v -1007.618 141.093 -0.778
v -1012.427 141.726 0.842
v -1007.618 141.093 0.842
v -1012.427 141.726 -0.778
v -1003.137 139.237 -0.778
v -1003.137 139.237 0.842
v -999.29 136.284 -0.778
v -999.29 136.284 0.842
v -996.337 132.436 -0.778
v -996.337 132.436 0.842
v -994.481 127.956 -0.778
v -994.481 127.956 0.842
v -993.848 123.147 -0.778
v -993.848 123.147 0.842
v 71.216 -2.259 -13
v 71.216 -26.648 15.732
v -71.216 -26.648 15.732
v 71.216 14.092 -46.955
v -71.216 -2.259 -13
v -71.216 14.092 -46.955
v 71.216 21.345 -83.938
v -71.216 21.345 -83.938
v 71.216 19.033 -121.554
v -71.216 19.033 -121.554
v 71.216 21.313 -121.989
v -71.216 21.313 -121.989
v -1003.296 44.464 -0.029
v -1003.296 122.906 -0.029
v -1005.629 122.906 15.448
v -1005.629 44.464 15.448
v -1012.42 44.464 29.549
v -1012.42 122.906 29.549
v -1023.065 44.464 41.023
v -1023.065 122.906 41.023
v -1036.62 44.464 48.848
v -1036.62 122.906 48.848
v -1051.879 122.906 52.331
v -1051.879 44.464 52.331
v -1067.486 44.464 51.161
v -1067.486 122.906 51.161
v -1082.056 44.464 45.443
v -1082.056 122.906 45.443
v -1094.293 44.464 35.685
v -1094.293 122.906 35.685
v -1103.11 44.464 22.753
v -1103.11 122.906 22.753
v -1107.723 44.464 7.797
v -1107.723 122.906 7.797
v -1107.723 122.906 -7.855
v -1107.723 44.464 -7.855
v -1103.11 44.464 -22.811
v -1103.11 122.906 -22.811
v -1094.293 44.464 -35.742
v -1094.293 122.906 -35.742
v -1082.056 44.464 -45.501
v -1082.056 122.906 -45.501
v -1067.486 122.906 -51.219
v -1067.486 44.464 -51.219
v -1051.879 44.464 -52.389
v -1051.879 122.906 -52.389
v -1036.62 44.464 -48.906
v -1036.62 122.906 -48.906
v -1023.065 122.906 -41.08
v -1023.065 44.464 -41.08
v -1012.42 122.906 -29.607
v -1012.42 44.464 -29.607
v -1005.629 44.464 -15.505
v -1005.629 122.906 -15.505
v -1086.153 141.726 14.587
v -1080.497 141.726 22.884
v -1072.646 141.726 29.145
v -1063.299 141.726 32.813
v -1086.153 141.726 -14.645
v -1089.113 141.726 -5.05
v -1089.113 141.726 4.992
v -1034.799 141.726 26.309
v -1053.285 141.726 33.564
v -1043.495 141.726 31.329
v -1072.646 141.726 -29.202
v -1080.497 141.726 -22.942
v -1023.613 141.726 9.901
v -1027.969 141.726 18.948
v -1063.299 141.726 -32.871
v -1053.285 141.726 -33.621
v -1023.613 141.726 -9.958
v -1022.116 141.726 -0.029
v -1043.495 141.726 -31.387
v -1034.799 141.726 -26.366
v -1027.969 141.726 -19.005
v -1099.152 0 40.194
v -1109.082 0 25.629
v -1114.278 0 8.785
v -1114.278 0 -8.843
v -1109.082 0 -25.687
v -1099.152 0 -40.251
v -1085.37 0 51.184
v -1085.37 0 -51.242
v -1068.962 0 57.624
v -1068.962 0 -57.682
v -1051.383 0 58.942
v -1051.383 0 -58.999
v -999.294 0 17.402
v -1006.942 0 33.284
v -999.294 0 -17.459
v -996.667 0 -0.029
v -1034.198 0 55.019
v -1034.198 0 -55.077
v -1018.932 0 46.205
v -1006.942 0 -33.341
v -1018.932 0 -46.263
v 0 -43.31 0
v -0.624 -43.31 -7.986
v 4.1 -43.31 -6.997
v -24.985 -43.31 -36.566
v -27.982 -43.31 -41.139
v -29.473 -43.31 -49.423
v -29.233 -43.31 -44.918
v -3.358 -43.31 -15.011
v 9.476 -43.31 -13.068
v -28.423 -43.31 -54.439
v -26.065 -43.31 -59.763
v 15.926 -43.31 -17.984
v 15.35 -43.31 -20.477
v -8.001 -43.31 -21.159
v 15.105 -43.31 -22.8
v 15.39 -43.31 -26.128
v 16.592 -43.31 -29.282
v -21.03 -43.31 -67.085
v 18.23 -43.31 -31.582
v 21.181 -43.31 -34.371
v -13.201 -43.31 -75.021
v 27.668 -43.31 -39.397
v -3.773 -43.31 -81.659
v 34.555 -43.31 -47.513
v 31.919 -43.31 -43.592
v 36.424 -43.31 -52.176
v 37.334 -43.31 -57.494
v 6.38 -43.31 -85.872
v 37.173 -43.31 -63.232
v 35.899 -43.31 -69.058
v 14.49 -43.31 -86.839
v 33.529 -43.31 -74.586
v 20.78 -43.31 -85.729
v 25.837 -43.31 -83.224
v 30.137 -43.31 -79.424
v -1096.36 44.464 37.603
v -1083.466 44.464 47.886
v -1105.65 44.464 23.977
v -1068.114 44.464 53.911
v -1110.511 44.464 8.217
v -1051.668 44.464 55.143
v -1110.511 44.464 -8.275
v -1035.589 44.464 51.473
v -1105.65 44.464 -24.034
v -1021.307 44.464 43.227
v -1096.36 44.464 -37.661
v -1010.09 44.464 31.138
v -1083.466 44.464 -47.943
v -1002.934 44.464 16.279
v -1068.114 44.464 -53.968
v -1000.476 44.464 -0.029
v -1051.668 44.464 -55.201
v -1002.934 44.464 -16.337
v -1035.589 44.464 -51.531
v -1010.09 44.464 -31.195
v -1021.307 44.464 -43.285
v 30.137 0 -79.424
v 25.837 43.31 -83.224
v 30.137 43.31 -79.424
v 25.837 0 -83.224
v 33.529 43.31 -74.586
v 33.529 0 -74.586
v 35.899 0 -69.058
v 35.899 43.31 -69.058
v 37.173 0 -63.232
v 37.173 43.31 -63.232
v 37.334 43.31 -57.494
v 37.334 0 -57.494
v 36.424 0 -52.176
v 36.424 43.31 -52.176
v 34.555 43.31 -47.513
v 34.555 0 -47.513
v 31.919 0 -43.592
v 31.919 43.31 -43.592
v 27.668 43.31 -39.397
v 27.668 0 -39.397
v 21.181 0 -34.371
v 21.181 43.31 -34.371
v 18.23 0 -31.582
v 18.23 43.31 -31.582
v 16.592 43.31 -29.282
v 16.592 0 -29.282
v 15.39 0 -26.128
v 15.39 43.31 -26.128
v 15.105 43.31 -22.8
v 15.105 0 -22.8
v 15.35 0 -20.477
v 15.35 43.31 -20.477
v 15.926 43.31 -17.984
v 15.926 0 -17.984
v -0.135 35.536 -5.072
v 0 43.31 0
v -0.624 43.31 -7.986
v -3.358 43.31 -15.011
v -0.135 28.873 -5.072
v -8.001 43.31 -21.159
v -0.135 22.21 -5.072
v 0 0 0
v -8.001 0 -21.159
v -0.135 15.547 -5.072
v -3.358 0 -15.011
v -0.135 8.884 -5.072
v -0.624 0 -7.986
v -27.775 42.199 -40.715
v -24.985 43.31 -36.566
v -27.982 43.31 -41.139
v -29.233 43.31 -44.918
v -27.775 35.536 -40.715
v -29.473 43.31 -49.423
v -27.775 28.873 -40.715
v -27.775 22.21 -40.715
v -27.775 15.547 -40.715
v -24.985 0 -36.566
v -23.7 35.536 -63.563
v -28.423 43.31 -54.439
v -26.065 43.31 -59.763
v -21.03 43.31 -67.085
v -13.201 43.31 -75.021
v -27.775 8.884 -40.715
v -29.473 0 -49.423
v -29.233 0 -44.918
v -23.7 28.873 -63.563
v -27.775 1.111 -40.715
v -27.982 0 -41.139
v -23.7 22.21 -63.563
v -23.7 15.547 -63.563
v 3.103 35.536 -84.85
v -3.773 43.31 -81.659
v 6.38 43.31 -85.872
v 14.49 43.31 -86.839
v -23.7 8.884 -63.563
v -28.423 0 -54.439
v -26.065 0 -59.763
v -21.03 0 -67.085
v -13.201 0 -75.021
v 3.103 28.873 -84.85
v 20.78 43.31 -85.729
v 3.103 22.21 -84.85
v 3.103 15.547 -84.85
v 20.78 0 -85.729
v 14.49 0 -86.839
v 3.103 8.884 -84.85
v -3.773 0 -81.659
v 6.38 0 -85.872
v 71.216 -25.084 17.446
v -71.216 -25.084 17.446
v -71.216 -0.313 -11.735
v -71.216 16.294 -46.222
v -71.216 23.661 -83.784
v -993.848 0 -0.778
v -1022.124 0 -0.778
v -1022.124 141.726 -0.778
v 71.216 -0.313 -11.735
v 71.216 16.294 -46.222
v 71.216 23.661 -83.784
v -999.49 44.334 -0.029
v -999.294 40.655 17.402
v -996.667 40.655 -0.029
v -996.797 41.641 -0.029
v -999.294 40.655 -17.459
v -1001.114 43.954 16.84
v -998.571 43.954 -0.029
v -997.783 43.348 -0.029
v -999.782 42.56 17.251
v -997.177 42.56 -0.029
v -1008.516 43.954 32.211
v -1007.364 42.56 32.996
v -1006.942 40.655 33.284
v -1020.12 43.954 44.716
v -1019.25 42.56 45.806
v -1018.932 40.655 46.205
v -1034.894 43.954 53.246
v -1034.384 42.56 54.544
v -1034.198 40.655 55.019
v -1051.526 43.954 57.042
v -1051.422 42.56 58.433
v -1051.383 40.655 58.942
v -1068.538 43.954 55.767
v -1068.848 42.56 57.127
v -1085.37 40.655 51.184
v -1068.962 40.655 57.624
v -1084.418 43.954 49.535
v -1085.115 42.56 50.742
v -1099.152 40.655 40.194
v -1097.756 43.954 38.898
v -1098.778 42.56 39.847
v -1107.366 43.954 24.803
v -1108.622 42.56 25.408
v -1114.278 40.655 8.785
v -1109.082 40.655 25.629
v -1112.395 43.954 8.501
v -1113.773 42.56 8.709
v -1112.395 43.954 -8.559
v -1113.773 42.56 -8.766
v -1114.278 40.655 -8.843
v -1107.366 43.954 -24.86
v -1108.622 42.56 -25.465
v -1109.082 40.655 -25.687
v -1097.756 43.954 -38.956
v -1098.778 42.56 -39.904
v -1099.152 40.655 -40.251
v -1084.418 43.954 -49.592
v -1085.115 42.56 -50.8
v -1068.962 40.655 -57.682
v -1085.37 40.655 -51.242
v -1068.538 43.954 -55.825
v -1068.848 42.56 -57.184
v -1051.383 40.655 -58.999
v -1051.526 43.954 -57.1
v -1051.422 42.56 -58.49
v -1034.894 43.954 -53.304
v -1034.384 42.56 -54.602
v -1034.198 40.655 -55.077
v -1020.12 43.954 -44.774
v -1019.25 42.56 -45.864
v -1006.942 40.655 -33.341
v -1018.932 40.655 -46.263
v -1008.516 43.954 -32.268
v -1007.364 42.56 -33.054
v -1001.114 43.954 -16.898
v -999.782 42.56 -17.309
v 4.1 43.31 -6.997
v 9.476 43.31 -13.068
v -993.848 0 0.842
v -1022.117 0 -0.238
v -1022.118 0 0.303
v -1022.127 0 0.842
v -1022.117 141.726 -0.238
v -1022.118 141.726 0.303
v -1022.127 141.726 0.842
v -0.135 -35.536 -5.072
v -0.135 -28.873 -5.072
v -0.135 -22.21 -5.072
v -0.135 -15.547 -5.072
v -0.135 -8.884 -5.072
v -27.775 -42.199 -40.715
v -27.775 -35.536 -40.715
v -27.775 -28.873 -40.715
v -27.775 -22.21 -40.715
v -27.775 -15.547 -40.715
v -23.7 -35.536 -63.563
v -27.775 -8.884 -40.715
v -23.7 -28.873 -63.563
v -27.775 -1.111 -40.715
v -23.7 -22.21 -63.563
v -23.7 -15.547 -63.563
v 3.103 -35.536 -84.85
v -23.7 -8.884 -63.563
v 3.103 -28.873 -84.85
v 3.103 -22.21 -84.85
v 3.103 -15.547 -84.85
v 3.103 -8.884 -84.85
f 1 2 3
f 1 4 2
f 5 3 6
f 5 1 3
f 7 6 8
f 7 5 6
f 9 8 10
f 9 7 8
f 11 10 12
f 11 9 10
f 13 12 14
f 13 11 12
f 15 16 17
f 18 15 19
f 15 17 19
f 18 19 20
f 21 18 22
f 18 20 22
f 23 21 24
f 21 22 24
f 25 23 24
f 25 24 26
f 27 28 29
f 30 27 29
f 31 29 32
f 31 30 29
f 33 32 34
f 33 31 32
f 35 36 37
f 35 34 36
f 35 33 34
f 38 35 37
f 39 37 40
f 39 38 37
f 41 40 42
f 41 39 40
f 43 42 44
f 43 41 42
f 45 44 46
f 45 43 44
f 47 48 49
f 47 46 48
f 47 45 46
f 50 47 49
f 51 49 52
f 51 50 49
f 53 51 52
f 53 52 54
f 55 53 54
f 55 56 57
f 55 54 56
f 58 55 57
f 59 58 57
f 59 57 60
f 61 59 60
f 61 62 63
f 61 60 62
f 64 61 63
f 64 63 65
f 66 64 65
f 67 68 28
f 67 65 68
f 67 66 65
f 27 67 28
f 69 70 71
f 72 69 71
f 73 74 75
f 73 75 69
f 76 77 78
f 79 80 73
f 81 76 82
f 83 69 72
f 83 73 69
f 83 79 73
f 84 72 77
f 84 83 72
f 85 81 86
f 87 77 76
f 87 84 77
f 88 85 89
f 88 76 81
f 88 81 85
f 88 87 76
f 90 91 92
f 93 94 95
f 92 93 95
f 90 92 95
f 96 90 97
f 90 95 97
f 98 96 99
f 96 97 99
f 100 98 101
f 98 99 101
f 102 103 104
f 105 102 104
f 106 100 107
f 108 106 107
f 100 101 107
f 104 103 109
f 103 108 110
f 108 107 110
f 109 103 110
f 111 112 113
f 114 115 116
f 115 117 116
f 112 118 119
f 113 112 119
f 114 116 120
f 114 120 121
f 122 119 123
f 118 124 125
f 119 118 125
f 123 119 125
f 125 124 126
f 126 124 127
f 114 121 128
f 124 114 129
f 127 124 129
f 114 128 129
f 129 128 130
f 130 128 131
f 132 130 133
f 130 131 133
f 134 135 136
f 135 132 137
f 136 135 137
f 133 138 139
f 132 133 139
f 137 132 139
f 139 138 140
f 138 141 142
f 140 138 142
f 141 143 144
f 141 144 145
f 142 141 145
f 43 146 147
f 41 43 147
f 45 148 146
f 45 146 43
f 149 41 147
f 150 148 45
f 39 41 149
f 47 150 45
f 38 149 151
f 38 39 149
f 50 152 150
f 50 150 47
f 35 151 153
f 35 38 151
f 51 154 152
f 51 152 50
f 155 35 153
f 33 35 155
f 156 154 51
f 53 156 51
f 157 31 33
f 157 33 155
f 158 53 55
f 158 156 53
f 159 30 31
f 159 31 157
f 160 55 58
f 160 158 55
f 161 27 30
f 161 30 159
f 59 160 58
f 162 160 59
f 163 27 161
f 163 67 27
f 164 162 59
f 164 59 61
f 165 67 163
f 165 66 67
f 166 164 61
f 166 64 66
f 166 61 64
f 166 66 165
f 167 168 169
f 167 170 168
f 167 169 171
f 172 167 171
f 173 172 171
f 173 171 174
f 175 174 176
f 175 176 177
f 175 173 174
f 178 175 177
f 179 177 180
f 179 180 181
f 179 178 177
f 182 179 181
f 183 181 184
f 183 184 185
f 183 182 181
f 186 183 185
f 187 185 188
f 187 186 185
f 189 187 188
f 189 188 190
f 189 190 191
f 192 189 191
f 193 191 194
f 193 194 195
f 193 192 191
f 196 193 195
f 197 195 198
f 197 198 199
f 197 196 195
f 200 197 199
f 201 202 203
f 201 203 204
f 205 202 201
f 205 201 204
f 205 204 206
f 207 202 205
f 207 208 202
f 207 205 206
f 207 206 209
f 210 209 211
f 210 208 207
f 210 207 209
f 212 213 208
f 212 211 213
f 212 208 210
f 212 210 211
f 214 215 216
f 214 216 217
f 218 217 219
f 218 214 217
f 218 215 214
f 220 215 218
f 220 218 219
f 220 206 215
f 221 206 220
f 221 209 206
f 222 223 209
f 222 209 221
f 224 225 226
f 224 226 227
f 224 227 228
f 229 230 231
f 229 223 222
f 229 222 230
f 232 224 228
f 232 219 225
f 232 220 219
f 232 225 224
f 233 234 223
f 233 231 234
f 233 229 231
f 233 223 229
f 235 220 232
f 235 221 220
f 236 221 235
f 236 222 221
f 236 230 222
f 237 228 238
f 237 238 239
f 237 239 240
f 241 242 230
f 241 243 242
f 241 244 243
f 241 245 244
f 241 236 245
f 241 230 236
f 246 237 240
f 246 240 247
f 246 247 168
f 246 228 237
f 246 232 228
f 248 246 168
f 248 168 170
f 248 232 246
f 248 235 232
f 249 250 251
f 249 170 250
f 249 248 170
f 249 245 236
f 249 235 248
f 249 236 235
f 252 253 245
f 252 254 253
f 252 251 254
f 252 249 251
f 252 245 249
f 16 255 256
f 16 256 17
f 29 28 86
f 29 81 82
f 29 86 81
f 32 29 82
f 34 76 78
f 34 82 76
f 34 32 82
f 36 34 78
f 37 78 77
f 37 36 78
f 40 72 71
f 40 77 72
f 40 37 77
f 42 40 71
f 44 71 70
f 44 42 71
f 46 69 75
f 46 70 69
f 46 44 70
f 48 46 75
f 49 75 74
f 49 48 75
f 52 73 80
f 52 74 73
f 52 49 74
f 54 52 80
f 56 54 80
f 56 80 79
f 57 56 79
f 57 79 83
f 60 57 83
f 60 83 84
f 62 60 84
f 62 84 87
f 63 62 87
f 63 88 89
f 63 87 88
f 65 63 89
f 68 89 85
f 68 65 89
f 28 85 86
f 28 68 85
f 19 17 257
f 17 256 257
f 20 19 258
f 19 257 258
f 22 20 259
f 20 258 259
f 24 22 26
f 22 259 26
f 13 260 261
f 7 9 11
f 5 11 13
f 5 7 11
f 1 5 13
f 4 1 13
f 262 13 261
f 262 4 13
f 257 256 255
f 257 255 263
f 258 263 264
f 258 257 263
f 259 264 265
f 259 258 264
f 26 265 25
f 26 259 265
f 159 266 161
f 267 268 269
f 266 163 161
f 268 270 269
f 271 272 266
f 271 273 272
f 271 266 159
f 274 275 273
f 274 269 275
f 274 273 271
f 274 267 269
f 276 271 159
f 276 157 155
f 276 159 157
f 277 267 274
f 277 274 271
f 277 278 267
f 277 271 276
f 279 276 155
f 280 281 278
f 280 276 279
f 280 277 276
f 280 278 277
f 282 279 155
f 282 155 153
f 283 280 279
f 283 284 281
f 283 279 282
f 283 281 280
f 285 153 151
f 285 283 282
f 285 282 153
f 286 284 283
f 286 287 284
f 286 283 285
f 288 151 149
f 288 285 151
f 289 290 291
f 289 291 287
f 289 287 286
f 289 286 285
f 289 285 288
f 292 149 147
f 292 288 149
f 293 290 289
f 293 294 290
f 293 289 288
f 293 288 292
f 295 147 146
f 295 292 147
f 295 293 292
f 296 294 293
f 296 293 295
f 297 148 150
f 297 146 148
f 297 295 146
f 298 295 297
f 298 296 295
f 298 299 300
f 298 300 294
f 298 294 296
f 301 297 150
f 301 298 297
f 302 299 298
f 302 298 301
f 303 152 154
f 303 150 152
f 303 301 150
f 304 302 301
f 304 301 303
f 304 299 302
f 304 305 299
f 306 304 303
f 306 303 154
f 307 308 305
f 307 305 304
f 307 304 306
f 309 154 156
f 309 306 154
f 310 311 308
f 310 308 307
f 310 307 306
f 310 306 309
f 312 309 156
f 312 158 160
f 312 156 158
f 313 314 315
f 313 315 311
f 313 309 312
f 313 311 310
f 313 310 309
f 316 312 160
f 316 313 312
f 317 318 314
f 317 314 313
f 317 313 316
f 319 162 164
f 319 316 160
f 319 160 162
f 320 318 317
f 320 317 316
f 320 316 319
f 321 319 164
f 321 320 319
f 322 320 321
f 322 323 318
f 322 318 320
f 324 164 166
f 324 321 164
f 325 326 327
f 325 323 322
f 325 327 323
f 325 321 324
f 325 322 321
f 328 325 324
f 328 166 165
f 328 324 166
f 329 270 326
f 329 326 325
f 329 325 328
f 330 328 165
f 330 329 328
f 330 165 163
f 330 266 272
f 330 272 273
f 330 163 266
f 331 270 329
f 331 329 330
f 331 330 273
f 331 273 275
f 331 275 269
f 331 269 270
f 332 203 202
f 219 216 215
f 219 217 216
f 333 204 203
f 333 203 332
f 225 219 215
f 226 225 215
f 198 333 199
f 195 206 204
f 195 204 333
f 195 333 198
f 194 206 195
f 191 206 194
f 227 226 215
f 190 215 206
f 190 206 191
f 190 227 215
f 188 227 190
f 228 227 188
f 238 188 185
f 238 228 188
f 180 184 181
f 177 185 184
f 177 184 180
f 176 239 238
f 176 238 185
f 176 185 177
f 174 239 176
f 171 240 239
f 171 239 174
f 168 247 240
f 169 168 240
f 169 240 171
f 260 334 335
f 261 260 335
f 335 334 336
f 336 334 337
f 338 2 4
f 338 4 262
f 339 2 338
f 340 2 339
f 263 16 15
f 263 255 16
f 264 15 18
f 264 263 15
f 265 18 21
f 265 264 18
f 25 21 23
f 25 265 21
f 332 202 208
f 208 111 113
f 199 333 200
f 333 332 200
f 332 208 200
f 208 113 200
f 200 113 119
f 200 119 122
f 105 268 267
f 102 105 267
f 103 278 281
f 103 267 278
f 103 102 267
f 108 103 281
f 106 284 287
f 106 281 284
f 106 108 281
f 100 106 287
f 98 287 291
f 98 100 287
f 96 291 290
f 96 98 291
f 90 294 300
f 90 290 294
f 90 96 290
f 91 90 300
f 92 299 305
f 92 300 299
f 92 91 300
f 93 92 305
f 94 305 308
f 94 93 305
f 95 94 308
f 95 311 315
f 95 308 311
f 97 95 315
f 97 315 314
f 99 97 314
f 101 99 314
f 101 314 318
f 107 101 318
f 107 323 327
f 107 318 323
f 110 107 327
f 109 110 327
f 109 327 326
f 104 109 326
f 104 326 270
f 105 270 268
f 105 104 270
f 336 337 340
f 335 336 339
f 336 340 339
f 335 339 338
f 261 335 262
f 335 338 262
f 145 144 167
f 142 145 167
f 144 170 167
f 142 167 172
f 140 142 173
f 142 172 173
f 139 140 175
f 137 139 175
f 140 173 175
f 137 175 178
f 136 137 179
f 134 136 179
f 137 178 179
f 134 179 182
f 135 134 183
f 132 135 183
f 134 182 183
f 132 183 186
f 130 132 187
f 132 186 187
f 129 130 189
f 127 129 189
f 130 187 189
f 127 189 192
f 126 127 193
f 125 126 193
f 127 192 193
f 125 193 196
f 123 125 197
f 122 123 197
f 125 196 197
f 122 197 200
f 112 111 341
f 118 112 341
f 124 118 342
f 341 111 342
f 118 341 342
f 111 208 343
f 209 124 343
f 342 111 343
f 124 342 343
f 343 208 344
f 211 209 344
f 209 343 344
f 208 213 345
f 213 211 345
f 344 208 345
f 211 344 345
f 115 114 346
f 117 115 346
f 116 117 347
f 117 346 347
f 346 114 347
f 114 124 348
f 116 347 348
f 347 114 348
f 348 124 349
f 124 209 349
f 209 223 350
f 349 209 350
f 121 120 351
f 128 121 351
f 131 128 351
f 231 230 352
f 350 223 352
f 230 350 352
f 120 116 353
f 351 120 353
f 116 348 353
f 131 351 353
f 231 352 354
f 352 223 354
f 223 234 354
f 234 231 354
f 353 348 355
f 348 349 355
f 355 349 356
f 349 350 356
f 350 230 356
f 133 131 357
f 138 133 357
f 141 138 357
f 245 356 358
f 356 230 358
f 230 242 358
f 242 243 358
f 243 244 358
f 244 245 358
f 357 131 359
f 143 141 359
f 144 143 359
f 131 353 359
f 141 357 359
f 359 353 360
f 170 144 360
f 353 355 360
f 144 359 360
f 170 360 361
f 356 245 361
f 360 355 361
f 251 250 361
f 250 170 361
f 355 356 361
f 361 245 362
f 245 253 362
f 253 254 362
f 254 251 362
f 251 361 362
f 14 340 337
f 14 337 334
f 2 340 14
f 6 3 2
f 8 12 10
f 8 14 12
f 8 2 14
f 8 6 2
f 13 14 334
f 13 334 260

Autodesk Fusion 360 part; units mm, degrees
sketch "Sketch1" plane through (0, 0, 0) normal (0, 1, 0) x (1, 0, 0)
  spline S0 degree 5 poles (0, 0) (0.0619, 1.1722) (0.0831, 3.4699) (-0.1929, 6.7763) (-1.1772, 10.9043) (-3.4126, 15.6061) (-6.576, 19.8821) (-10.5098, 23.799) (-14.9381, 27.4739) (-19.4646, 31.0742) (-23.6399, 34.7853) (-27.0158, 38.784) (-29.2005, 43.2113) (-29.924, 48.1422) (-29.0612, 53.5689) (-26.6045, 59.4018) (-22.6508, 65.4644) (-17.3842, 71.4924) (-11.0602, 77.1242) (-3.9899, 81.916) (3.4782, 85.4117) (10.9753, 87.2028) (18.13, 86.9915) (24.5856, 84.6553) (30.0175, 80.3073) (34.1503, 74.3713) (36.7795, 67.4723) (37.7922, 60.3152) (37.19, 53.565) (35.109, 47.7341) (31.85, 43.0476) (27.8797, 39.3735) (23.7418, 36.367) (19.9788, 33.5816) (17.0583, 30.5831) (15.2775, 27.0863) (14.8757, 23.7837) (15.1697, 21.0022) (15.6298, 19.0128) (15.926, 17.9844) knots 0 0 0 0 0 0 0.028571 0.057143 0.085714 0.114286 0.142857 0.171429 0.2 0.228571 0.257143 0.285714 0.314286 0.342857 0.371429 0.4 0.428571 0.457143 0.485714 0.514286 0.542857 0.571429 0.6 0.628571 0.657143 0.685714 0.714286 0.742857 0.771429 0.8 0.828571 0.857143 0.885714 0.914286 0.942857 0.971429 1 1 1 1 1 1
  arc A0 (15.926, 17.9844) -> (0, 0) centre (37.8656, -17.4879) ccw
  point P0 (-9.2465, 22.4266)
  point P1 (-28.0025, 41.1826)
  point P2 (-18.8713, 69.5633)
  point P3 (24.8104, 83.8771)
  point P4 (35.4223, 49.3266)
  point P5 (19.1342, 32.545)
sketch "Sketch2" plane through (0, 0, 0) normal (1, 0, 0) x (0, 0, -1)
  line L0 (0, 0) -> (86.853, 0)
  arc A0 (121.9894, 21.3126) -> (-17.4465, -25.0838) centre (93.7289, -126.4784) ccw
  arc A1 (121.5535, 19.0328) -> (-15.7315, -26.6478) centre (93.7289, -126.4784) ccw
  line L1 (-17.4465, -25.0838) -> (-15.7315, -26.6478)
  line L2 (121.5535, 19.0328) -> (121.9894, 21.3126)
  dimension "d1" = -2.3211
extrude "Extrude1" add sketch "Sketch1" along normal mid plane 86.62 makes body 1
extrude "Extrude2" add sketch "Sketch2" along normal mid plane 142.432 separate body makes body 2
sketch "Sketch3" plane through (0, 0, 0) normal (0, 1, 0) x (1, 0, 0)
  circle A0 centre (-1055.8026, 0.0288) radius 52.5067
  circle A1 centre (-1055.8026, 0.0288) radius 59.1357
extrude "Extrude3" add sketch "Sketch3" along normal blind 141.726 separate body contours A0 makes body 3
extrude "Extrude4" add sketch "Sketch3" along normal blind 44.464 bodies 3
fillet "Fillet1" radius 3.809 1 edges at (-1110.9365, 44.464, 21.3556) on bodies 3
chamfer "Chamfer1" distance 18.82 angle 45 1 edges at (-1104.7561, 141.726, 18.9585) on bodies 3
sketch "Sketch4" plane through (0, 141.726, 0) normal (0, 1, 0) x (-1, 0, 0)
  circle A0 centre (1055.8026, -0.0288) radius 33.6867
  line L0 (1024.6879, 0.8425) -> (993.8479, 0.8425)
  line L1 (993.8479, 0.8425) -> (993.8479, -0.7775)
  line L2 (993.8479, -0.7775) -> (1024.6879, -0.7775)
  line L3 (1024.6879, -0.7775) -> (1024.6879, 0.8425)
  circle A1 centre (1055.8026, -0.0288) radius 52.5067
extrude "Extrude5" add sketch "Sketch4" against normal up to surface (141.726 mm away) separate body contours A0 L0 L2 A1 | L0 L1 L2 A1 picked at (1015.8474, -0.5975) makes body 4
fillet "Fillet2" radius 18.579 1 edges at (-993.8479, 141.726, 0.0325) on bodies 4
